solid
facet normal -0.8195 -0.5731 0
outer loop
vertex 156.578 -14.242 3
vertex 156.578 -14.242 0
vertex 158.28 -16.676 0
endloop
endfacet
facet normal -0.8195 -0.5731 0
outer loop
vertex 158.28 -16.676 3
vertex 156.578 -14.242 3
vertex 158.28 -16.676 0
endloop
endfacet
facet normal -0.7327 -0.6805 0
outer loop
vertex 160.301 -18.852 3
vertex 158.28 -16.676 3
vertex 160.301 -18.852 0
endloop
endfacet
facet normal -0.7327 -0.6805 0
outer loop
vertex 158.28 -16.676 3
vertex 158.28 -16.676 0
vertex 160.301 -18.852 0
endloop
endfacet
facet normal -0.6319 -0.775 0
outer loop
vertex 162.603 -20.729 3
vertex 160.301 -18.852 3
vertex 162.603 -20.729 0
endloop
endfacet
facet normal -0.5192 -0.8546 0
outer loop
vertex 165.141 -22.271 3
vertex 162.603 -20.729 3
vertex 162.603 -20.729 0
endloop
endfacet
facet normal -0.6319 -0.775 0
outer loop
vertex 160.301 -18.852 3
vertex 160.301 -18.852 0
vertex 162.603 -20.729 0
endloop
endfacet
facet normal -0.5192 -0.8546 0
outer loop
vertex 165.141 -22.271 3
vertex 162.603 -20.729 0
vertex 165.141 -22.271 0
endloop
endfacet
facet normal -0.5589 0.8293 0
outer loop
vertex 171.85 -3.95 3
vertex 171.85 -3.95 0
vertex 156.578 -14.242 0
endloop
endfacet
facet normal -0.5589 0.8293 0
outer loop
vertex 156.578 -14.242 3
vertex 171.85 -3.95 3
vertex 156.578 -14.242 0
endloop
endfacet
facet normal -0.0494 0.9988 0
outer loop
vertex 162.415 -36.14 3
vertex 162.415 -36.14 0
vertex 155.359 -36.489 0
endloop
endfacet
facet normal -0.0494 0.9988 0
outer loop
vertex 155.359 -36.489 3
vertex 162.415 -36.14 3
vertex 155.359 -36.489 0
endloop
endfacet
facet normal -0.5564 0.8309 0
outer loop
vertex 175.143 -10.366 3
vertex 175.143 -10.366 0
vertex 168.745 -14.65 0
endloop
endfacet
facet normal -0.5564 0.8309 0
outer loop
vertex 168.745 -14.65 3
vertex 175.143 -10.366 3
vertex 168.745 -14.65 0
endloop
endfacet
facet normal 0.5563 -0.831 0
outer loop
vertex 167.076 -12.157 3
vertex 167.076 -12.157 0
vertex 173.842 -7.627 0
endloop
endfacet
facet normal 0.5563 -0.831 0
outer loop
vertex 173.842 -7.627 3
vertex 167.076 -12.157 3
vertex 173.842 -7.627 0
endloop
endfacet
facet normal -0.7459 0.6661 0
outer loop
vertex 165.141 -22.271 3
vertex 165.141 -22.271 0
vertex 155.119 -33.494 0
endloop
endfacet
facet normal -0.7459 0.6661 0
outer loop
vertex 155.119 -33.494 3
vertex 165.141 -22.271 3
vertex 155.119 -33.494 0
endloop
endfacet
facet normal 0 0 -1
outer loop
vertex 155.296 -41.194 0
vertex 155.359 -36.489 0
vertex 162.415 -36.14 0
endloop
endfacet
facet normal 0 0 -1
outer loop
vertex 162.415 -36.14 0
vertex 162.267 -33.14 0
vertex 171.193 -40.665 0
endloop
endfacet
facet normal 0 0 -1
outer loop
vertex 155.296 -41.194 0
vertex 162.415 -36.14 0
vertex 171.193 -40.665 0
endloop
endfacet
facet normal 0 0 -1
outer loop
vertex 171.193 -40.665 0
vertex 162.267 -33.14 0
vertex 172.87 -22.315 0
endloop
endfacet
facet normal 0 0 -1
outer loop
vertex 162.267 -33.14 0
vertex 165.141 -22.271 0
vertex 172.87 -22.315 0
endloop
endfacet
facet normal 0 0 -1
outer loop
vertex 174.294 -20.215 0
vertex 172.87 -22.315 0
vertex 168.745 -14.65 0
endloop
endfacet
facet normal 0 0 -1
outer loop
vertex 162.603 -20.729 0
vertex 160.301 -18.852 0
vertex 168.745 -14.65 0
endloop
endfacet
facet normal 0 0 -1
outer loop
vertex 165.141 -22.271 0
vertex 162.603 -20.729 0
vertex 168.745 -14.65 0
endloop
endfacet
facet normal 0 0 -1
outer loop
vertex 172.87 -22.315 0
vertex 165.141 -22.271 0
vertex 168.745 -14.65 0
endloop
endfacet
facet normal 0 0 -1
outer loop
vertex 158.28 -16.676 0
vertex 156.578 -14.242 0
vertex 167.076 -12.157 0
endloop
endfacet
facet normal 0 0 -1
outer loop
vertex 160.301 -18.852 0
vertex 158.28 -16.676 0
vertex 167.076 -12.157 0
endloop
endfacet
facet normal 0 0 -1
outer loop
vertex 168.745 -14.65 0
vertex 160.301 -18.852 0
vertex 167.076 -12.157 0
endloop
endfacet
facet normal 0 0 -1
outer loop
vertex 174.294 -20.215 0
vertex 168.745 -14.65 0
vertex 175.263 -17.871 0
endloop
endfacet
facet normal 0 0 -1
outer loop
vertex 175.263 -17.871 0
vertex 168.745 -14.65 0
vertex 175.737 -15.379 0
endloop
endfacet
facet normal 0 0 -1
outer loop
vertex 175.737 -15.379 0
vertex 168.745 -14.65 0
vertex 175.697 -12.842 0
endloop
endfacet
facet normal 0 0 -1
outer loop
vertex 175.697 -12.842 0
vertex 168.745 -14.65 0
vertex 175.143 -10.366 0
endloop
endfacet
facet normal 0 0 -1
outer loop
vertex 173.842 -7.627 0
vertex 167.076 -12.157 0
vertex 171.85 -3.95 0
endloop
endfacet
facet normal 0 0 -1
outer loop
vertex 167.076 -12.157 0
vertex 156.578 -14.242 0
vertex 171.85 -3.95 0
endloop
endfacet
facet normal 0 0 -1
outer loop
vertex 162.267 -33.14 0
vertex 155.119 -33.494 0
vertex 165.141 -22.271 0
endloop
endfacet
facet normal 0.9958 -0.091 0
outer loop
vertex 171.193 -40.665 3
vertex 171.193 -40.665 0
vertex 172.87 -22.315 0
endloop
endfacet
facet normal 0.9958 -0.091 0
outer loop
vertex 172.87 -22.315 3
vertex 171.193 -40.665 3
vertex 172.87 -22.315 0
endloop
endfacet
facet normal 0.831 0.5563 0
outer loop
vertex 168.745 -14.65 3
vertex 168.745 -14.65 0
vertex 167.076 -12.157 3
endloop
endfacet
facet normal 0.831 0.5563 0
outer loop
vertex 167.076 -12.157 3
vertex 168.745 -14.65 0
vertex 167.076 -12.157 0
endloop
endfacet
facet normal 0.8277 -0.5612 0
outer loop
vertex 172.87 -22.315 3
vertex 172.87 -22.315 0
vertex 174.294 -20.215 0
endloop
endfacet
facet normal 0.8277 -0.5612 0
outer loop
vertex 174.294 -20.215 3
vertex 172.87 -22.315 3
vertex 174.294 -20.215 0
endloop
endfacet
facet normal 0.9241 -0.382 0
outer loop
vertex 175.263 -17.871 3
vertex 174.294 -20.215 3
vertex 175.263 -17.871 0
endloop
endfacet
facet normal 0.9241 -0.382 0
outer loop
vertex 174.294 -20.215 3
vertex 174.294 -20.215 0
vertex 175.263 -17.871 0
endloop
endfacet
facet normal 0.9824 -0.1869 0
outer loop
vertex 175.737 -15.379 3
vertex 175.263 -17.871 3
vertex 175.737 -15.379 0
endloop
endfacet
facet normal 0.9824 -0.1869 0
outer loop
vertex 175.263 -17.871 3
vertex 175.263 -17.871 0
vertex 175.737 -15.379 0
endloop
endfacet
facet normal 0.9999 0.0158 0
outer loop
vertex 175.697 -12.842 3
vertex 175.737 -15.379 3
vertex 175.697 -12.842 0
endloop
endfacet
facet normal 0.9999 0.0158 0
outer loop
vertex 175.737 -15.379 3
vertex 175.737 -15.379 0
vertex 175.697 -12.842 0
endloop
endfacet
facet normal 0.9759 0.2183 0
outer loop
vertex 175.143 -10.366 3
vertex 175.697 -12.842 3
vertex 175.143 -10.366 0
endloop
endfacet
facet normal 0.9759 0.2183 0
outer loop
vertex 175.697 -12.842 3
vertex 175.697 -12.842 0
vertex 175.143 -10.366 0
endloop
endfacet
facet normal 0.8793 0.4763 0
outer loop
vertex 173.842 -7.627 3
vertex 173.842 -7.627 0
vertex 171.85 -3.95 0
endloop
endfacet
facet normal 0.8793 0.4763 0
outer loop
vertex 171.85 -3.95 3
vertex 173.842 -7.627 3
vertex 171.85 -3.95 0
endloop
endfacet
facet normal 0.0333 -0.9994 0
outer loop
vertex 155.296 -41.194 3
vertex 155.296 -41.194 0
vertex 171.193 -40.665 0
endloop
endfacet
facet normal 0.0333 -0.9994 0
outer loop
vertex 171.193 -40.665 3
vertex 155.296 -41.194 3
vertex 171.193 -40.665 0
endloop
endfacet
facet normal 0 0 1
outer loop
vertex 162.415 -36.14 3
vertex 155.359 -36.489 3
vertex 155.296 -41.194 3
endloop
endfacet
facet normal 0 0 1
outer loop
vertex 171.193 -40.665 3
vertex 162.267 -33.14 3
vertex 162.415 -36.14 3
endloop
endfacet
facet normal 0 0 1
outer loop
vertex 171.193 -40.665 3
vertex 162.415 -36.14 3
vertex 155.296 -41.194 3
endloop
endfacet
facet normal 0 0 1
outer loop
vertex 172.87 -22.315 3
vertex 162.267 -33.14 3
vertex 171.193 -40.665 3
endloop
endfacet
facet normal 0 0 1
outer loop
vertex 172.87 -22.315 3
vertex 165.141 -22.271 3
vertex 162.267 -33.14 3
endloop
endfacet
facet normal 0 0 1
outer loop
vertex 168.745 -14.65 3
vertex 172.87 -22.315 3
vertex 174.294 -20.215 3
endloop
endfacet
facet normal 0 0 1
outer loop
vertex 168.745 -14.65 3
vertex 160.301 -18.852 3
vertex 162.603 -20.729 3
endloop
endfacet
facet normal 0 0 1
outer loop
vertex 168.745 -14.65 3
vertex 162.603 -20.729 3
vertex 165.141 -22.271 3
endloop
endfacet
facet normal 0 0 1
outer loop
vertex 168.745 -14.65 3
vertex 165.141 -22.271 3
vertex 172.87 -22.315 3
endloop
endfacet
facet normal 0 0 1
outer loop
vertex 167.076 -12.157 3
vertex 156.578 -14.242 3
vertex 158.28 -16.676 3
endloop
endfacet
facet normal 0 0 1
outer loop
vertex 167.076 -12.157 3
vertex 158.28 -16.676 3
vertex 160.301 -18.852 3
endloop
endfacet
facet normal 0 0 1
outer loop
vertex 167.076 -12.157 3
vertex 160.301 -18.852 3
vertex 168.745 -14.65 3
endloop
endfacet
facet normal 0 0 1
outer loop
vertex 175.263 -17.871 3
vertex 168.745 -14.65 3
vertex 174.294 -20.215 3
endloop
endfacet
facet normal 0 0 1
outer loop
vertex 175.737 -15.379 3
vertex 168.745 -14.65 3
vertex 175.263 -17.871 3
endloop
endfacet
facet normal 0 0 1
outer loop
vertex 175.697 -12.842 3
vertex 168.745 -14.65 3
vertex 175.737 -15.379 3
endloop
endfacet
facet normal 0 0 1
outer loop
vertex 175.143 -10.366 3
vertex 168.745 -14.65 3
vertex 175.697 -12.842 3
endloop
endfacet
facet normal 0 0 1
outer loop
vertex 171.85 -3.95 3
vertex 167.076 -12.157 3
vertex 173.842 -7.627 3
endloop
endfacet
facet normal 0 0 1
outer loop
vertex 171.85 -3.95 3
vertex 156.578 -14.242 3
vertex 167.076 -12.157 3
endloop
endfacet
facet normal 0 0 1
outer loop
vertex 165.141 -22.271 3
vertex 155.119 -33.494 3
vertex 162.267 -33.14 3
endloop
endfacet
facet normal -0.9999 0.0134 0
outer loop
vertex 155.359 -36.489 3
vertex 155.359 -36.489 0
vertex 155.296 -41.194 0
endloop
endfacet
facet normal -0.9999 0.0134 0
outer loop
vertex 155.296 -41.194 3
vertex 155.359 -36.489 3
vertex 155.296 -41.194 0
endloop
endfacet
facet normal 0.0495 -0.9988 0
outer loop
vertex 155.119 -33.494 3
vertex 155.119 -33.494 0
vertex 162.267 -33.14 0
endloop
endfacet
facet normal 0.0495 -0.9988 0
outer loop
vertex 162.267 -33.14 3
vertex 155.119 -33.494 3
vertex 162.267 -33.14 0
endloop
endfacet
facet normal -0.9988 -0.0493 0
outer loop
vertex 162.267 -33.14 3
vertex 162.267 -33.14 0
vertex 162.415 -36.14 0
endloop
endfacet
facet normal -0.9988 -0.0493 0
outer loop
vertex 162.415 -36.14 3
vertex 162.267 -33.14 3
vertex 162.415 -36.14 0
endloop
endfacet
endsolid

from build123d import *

# Parameters (mm, degrees)
BASE_EXTRUDE_DEPTH = 3


with BuildPart() as part:
    # Sketch1 → Base-Extrude (new body)
    with BuildSketch(Plane.XY):
        with BuildLine():
            Line((171.192957442, -40.665135082), (172.870030556, -22.31508098))
            ThreePointArc((172.870030556, -22.31508098), (175.563665965, -16.636900634), (175.142919492, -10.366304477))
            Line((175.142919492, -10.366304477), (168.744811214, -14.64960541))
            Line((168.744811214, -14.64960541), (167.075886495, -12.156677356))
            Line((167.075886495, -12.156677356), (173.841852345, -7.62710915))
            Line((173.841852345, -7.62710915), (171.850357265, -3.949661926))
            Line((171.850357265, -3.949661926), (156.57808296, -14.242043783))
            ThreePointArc((156.57808296, -14.242043783), (160.301341172, -18.851655885), (165.14064427, -22.271059484))
            Line((165.14064427, -22.271059484), (155.118780374, -33.49392187))
            Line((155.118780374, -33.49392187), (162.266864396, -33.140436707))
            Line((162.266864396, -33.140436707), (162.415219603, -36.140436707))
            Line((162.415219603, -36.140436707), (155.359396637, -36.4893594))
            Line((155.359396637, -36.4893594), (155.295598836, -41.193899126))
            Line((155.295598836, -41.193899126), (171.192957442, -40.665135082))
        make_face()
    extrude(amount=BASE_EXTRUDE_DEPTH)


solid = part.part
